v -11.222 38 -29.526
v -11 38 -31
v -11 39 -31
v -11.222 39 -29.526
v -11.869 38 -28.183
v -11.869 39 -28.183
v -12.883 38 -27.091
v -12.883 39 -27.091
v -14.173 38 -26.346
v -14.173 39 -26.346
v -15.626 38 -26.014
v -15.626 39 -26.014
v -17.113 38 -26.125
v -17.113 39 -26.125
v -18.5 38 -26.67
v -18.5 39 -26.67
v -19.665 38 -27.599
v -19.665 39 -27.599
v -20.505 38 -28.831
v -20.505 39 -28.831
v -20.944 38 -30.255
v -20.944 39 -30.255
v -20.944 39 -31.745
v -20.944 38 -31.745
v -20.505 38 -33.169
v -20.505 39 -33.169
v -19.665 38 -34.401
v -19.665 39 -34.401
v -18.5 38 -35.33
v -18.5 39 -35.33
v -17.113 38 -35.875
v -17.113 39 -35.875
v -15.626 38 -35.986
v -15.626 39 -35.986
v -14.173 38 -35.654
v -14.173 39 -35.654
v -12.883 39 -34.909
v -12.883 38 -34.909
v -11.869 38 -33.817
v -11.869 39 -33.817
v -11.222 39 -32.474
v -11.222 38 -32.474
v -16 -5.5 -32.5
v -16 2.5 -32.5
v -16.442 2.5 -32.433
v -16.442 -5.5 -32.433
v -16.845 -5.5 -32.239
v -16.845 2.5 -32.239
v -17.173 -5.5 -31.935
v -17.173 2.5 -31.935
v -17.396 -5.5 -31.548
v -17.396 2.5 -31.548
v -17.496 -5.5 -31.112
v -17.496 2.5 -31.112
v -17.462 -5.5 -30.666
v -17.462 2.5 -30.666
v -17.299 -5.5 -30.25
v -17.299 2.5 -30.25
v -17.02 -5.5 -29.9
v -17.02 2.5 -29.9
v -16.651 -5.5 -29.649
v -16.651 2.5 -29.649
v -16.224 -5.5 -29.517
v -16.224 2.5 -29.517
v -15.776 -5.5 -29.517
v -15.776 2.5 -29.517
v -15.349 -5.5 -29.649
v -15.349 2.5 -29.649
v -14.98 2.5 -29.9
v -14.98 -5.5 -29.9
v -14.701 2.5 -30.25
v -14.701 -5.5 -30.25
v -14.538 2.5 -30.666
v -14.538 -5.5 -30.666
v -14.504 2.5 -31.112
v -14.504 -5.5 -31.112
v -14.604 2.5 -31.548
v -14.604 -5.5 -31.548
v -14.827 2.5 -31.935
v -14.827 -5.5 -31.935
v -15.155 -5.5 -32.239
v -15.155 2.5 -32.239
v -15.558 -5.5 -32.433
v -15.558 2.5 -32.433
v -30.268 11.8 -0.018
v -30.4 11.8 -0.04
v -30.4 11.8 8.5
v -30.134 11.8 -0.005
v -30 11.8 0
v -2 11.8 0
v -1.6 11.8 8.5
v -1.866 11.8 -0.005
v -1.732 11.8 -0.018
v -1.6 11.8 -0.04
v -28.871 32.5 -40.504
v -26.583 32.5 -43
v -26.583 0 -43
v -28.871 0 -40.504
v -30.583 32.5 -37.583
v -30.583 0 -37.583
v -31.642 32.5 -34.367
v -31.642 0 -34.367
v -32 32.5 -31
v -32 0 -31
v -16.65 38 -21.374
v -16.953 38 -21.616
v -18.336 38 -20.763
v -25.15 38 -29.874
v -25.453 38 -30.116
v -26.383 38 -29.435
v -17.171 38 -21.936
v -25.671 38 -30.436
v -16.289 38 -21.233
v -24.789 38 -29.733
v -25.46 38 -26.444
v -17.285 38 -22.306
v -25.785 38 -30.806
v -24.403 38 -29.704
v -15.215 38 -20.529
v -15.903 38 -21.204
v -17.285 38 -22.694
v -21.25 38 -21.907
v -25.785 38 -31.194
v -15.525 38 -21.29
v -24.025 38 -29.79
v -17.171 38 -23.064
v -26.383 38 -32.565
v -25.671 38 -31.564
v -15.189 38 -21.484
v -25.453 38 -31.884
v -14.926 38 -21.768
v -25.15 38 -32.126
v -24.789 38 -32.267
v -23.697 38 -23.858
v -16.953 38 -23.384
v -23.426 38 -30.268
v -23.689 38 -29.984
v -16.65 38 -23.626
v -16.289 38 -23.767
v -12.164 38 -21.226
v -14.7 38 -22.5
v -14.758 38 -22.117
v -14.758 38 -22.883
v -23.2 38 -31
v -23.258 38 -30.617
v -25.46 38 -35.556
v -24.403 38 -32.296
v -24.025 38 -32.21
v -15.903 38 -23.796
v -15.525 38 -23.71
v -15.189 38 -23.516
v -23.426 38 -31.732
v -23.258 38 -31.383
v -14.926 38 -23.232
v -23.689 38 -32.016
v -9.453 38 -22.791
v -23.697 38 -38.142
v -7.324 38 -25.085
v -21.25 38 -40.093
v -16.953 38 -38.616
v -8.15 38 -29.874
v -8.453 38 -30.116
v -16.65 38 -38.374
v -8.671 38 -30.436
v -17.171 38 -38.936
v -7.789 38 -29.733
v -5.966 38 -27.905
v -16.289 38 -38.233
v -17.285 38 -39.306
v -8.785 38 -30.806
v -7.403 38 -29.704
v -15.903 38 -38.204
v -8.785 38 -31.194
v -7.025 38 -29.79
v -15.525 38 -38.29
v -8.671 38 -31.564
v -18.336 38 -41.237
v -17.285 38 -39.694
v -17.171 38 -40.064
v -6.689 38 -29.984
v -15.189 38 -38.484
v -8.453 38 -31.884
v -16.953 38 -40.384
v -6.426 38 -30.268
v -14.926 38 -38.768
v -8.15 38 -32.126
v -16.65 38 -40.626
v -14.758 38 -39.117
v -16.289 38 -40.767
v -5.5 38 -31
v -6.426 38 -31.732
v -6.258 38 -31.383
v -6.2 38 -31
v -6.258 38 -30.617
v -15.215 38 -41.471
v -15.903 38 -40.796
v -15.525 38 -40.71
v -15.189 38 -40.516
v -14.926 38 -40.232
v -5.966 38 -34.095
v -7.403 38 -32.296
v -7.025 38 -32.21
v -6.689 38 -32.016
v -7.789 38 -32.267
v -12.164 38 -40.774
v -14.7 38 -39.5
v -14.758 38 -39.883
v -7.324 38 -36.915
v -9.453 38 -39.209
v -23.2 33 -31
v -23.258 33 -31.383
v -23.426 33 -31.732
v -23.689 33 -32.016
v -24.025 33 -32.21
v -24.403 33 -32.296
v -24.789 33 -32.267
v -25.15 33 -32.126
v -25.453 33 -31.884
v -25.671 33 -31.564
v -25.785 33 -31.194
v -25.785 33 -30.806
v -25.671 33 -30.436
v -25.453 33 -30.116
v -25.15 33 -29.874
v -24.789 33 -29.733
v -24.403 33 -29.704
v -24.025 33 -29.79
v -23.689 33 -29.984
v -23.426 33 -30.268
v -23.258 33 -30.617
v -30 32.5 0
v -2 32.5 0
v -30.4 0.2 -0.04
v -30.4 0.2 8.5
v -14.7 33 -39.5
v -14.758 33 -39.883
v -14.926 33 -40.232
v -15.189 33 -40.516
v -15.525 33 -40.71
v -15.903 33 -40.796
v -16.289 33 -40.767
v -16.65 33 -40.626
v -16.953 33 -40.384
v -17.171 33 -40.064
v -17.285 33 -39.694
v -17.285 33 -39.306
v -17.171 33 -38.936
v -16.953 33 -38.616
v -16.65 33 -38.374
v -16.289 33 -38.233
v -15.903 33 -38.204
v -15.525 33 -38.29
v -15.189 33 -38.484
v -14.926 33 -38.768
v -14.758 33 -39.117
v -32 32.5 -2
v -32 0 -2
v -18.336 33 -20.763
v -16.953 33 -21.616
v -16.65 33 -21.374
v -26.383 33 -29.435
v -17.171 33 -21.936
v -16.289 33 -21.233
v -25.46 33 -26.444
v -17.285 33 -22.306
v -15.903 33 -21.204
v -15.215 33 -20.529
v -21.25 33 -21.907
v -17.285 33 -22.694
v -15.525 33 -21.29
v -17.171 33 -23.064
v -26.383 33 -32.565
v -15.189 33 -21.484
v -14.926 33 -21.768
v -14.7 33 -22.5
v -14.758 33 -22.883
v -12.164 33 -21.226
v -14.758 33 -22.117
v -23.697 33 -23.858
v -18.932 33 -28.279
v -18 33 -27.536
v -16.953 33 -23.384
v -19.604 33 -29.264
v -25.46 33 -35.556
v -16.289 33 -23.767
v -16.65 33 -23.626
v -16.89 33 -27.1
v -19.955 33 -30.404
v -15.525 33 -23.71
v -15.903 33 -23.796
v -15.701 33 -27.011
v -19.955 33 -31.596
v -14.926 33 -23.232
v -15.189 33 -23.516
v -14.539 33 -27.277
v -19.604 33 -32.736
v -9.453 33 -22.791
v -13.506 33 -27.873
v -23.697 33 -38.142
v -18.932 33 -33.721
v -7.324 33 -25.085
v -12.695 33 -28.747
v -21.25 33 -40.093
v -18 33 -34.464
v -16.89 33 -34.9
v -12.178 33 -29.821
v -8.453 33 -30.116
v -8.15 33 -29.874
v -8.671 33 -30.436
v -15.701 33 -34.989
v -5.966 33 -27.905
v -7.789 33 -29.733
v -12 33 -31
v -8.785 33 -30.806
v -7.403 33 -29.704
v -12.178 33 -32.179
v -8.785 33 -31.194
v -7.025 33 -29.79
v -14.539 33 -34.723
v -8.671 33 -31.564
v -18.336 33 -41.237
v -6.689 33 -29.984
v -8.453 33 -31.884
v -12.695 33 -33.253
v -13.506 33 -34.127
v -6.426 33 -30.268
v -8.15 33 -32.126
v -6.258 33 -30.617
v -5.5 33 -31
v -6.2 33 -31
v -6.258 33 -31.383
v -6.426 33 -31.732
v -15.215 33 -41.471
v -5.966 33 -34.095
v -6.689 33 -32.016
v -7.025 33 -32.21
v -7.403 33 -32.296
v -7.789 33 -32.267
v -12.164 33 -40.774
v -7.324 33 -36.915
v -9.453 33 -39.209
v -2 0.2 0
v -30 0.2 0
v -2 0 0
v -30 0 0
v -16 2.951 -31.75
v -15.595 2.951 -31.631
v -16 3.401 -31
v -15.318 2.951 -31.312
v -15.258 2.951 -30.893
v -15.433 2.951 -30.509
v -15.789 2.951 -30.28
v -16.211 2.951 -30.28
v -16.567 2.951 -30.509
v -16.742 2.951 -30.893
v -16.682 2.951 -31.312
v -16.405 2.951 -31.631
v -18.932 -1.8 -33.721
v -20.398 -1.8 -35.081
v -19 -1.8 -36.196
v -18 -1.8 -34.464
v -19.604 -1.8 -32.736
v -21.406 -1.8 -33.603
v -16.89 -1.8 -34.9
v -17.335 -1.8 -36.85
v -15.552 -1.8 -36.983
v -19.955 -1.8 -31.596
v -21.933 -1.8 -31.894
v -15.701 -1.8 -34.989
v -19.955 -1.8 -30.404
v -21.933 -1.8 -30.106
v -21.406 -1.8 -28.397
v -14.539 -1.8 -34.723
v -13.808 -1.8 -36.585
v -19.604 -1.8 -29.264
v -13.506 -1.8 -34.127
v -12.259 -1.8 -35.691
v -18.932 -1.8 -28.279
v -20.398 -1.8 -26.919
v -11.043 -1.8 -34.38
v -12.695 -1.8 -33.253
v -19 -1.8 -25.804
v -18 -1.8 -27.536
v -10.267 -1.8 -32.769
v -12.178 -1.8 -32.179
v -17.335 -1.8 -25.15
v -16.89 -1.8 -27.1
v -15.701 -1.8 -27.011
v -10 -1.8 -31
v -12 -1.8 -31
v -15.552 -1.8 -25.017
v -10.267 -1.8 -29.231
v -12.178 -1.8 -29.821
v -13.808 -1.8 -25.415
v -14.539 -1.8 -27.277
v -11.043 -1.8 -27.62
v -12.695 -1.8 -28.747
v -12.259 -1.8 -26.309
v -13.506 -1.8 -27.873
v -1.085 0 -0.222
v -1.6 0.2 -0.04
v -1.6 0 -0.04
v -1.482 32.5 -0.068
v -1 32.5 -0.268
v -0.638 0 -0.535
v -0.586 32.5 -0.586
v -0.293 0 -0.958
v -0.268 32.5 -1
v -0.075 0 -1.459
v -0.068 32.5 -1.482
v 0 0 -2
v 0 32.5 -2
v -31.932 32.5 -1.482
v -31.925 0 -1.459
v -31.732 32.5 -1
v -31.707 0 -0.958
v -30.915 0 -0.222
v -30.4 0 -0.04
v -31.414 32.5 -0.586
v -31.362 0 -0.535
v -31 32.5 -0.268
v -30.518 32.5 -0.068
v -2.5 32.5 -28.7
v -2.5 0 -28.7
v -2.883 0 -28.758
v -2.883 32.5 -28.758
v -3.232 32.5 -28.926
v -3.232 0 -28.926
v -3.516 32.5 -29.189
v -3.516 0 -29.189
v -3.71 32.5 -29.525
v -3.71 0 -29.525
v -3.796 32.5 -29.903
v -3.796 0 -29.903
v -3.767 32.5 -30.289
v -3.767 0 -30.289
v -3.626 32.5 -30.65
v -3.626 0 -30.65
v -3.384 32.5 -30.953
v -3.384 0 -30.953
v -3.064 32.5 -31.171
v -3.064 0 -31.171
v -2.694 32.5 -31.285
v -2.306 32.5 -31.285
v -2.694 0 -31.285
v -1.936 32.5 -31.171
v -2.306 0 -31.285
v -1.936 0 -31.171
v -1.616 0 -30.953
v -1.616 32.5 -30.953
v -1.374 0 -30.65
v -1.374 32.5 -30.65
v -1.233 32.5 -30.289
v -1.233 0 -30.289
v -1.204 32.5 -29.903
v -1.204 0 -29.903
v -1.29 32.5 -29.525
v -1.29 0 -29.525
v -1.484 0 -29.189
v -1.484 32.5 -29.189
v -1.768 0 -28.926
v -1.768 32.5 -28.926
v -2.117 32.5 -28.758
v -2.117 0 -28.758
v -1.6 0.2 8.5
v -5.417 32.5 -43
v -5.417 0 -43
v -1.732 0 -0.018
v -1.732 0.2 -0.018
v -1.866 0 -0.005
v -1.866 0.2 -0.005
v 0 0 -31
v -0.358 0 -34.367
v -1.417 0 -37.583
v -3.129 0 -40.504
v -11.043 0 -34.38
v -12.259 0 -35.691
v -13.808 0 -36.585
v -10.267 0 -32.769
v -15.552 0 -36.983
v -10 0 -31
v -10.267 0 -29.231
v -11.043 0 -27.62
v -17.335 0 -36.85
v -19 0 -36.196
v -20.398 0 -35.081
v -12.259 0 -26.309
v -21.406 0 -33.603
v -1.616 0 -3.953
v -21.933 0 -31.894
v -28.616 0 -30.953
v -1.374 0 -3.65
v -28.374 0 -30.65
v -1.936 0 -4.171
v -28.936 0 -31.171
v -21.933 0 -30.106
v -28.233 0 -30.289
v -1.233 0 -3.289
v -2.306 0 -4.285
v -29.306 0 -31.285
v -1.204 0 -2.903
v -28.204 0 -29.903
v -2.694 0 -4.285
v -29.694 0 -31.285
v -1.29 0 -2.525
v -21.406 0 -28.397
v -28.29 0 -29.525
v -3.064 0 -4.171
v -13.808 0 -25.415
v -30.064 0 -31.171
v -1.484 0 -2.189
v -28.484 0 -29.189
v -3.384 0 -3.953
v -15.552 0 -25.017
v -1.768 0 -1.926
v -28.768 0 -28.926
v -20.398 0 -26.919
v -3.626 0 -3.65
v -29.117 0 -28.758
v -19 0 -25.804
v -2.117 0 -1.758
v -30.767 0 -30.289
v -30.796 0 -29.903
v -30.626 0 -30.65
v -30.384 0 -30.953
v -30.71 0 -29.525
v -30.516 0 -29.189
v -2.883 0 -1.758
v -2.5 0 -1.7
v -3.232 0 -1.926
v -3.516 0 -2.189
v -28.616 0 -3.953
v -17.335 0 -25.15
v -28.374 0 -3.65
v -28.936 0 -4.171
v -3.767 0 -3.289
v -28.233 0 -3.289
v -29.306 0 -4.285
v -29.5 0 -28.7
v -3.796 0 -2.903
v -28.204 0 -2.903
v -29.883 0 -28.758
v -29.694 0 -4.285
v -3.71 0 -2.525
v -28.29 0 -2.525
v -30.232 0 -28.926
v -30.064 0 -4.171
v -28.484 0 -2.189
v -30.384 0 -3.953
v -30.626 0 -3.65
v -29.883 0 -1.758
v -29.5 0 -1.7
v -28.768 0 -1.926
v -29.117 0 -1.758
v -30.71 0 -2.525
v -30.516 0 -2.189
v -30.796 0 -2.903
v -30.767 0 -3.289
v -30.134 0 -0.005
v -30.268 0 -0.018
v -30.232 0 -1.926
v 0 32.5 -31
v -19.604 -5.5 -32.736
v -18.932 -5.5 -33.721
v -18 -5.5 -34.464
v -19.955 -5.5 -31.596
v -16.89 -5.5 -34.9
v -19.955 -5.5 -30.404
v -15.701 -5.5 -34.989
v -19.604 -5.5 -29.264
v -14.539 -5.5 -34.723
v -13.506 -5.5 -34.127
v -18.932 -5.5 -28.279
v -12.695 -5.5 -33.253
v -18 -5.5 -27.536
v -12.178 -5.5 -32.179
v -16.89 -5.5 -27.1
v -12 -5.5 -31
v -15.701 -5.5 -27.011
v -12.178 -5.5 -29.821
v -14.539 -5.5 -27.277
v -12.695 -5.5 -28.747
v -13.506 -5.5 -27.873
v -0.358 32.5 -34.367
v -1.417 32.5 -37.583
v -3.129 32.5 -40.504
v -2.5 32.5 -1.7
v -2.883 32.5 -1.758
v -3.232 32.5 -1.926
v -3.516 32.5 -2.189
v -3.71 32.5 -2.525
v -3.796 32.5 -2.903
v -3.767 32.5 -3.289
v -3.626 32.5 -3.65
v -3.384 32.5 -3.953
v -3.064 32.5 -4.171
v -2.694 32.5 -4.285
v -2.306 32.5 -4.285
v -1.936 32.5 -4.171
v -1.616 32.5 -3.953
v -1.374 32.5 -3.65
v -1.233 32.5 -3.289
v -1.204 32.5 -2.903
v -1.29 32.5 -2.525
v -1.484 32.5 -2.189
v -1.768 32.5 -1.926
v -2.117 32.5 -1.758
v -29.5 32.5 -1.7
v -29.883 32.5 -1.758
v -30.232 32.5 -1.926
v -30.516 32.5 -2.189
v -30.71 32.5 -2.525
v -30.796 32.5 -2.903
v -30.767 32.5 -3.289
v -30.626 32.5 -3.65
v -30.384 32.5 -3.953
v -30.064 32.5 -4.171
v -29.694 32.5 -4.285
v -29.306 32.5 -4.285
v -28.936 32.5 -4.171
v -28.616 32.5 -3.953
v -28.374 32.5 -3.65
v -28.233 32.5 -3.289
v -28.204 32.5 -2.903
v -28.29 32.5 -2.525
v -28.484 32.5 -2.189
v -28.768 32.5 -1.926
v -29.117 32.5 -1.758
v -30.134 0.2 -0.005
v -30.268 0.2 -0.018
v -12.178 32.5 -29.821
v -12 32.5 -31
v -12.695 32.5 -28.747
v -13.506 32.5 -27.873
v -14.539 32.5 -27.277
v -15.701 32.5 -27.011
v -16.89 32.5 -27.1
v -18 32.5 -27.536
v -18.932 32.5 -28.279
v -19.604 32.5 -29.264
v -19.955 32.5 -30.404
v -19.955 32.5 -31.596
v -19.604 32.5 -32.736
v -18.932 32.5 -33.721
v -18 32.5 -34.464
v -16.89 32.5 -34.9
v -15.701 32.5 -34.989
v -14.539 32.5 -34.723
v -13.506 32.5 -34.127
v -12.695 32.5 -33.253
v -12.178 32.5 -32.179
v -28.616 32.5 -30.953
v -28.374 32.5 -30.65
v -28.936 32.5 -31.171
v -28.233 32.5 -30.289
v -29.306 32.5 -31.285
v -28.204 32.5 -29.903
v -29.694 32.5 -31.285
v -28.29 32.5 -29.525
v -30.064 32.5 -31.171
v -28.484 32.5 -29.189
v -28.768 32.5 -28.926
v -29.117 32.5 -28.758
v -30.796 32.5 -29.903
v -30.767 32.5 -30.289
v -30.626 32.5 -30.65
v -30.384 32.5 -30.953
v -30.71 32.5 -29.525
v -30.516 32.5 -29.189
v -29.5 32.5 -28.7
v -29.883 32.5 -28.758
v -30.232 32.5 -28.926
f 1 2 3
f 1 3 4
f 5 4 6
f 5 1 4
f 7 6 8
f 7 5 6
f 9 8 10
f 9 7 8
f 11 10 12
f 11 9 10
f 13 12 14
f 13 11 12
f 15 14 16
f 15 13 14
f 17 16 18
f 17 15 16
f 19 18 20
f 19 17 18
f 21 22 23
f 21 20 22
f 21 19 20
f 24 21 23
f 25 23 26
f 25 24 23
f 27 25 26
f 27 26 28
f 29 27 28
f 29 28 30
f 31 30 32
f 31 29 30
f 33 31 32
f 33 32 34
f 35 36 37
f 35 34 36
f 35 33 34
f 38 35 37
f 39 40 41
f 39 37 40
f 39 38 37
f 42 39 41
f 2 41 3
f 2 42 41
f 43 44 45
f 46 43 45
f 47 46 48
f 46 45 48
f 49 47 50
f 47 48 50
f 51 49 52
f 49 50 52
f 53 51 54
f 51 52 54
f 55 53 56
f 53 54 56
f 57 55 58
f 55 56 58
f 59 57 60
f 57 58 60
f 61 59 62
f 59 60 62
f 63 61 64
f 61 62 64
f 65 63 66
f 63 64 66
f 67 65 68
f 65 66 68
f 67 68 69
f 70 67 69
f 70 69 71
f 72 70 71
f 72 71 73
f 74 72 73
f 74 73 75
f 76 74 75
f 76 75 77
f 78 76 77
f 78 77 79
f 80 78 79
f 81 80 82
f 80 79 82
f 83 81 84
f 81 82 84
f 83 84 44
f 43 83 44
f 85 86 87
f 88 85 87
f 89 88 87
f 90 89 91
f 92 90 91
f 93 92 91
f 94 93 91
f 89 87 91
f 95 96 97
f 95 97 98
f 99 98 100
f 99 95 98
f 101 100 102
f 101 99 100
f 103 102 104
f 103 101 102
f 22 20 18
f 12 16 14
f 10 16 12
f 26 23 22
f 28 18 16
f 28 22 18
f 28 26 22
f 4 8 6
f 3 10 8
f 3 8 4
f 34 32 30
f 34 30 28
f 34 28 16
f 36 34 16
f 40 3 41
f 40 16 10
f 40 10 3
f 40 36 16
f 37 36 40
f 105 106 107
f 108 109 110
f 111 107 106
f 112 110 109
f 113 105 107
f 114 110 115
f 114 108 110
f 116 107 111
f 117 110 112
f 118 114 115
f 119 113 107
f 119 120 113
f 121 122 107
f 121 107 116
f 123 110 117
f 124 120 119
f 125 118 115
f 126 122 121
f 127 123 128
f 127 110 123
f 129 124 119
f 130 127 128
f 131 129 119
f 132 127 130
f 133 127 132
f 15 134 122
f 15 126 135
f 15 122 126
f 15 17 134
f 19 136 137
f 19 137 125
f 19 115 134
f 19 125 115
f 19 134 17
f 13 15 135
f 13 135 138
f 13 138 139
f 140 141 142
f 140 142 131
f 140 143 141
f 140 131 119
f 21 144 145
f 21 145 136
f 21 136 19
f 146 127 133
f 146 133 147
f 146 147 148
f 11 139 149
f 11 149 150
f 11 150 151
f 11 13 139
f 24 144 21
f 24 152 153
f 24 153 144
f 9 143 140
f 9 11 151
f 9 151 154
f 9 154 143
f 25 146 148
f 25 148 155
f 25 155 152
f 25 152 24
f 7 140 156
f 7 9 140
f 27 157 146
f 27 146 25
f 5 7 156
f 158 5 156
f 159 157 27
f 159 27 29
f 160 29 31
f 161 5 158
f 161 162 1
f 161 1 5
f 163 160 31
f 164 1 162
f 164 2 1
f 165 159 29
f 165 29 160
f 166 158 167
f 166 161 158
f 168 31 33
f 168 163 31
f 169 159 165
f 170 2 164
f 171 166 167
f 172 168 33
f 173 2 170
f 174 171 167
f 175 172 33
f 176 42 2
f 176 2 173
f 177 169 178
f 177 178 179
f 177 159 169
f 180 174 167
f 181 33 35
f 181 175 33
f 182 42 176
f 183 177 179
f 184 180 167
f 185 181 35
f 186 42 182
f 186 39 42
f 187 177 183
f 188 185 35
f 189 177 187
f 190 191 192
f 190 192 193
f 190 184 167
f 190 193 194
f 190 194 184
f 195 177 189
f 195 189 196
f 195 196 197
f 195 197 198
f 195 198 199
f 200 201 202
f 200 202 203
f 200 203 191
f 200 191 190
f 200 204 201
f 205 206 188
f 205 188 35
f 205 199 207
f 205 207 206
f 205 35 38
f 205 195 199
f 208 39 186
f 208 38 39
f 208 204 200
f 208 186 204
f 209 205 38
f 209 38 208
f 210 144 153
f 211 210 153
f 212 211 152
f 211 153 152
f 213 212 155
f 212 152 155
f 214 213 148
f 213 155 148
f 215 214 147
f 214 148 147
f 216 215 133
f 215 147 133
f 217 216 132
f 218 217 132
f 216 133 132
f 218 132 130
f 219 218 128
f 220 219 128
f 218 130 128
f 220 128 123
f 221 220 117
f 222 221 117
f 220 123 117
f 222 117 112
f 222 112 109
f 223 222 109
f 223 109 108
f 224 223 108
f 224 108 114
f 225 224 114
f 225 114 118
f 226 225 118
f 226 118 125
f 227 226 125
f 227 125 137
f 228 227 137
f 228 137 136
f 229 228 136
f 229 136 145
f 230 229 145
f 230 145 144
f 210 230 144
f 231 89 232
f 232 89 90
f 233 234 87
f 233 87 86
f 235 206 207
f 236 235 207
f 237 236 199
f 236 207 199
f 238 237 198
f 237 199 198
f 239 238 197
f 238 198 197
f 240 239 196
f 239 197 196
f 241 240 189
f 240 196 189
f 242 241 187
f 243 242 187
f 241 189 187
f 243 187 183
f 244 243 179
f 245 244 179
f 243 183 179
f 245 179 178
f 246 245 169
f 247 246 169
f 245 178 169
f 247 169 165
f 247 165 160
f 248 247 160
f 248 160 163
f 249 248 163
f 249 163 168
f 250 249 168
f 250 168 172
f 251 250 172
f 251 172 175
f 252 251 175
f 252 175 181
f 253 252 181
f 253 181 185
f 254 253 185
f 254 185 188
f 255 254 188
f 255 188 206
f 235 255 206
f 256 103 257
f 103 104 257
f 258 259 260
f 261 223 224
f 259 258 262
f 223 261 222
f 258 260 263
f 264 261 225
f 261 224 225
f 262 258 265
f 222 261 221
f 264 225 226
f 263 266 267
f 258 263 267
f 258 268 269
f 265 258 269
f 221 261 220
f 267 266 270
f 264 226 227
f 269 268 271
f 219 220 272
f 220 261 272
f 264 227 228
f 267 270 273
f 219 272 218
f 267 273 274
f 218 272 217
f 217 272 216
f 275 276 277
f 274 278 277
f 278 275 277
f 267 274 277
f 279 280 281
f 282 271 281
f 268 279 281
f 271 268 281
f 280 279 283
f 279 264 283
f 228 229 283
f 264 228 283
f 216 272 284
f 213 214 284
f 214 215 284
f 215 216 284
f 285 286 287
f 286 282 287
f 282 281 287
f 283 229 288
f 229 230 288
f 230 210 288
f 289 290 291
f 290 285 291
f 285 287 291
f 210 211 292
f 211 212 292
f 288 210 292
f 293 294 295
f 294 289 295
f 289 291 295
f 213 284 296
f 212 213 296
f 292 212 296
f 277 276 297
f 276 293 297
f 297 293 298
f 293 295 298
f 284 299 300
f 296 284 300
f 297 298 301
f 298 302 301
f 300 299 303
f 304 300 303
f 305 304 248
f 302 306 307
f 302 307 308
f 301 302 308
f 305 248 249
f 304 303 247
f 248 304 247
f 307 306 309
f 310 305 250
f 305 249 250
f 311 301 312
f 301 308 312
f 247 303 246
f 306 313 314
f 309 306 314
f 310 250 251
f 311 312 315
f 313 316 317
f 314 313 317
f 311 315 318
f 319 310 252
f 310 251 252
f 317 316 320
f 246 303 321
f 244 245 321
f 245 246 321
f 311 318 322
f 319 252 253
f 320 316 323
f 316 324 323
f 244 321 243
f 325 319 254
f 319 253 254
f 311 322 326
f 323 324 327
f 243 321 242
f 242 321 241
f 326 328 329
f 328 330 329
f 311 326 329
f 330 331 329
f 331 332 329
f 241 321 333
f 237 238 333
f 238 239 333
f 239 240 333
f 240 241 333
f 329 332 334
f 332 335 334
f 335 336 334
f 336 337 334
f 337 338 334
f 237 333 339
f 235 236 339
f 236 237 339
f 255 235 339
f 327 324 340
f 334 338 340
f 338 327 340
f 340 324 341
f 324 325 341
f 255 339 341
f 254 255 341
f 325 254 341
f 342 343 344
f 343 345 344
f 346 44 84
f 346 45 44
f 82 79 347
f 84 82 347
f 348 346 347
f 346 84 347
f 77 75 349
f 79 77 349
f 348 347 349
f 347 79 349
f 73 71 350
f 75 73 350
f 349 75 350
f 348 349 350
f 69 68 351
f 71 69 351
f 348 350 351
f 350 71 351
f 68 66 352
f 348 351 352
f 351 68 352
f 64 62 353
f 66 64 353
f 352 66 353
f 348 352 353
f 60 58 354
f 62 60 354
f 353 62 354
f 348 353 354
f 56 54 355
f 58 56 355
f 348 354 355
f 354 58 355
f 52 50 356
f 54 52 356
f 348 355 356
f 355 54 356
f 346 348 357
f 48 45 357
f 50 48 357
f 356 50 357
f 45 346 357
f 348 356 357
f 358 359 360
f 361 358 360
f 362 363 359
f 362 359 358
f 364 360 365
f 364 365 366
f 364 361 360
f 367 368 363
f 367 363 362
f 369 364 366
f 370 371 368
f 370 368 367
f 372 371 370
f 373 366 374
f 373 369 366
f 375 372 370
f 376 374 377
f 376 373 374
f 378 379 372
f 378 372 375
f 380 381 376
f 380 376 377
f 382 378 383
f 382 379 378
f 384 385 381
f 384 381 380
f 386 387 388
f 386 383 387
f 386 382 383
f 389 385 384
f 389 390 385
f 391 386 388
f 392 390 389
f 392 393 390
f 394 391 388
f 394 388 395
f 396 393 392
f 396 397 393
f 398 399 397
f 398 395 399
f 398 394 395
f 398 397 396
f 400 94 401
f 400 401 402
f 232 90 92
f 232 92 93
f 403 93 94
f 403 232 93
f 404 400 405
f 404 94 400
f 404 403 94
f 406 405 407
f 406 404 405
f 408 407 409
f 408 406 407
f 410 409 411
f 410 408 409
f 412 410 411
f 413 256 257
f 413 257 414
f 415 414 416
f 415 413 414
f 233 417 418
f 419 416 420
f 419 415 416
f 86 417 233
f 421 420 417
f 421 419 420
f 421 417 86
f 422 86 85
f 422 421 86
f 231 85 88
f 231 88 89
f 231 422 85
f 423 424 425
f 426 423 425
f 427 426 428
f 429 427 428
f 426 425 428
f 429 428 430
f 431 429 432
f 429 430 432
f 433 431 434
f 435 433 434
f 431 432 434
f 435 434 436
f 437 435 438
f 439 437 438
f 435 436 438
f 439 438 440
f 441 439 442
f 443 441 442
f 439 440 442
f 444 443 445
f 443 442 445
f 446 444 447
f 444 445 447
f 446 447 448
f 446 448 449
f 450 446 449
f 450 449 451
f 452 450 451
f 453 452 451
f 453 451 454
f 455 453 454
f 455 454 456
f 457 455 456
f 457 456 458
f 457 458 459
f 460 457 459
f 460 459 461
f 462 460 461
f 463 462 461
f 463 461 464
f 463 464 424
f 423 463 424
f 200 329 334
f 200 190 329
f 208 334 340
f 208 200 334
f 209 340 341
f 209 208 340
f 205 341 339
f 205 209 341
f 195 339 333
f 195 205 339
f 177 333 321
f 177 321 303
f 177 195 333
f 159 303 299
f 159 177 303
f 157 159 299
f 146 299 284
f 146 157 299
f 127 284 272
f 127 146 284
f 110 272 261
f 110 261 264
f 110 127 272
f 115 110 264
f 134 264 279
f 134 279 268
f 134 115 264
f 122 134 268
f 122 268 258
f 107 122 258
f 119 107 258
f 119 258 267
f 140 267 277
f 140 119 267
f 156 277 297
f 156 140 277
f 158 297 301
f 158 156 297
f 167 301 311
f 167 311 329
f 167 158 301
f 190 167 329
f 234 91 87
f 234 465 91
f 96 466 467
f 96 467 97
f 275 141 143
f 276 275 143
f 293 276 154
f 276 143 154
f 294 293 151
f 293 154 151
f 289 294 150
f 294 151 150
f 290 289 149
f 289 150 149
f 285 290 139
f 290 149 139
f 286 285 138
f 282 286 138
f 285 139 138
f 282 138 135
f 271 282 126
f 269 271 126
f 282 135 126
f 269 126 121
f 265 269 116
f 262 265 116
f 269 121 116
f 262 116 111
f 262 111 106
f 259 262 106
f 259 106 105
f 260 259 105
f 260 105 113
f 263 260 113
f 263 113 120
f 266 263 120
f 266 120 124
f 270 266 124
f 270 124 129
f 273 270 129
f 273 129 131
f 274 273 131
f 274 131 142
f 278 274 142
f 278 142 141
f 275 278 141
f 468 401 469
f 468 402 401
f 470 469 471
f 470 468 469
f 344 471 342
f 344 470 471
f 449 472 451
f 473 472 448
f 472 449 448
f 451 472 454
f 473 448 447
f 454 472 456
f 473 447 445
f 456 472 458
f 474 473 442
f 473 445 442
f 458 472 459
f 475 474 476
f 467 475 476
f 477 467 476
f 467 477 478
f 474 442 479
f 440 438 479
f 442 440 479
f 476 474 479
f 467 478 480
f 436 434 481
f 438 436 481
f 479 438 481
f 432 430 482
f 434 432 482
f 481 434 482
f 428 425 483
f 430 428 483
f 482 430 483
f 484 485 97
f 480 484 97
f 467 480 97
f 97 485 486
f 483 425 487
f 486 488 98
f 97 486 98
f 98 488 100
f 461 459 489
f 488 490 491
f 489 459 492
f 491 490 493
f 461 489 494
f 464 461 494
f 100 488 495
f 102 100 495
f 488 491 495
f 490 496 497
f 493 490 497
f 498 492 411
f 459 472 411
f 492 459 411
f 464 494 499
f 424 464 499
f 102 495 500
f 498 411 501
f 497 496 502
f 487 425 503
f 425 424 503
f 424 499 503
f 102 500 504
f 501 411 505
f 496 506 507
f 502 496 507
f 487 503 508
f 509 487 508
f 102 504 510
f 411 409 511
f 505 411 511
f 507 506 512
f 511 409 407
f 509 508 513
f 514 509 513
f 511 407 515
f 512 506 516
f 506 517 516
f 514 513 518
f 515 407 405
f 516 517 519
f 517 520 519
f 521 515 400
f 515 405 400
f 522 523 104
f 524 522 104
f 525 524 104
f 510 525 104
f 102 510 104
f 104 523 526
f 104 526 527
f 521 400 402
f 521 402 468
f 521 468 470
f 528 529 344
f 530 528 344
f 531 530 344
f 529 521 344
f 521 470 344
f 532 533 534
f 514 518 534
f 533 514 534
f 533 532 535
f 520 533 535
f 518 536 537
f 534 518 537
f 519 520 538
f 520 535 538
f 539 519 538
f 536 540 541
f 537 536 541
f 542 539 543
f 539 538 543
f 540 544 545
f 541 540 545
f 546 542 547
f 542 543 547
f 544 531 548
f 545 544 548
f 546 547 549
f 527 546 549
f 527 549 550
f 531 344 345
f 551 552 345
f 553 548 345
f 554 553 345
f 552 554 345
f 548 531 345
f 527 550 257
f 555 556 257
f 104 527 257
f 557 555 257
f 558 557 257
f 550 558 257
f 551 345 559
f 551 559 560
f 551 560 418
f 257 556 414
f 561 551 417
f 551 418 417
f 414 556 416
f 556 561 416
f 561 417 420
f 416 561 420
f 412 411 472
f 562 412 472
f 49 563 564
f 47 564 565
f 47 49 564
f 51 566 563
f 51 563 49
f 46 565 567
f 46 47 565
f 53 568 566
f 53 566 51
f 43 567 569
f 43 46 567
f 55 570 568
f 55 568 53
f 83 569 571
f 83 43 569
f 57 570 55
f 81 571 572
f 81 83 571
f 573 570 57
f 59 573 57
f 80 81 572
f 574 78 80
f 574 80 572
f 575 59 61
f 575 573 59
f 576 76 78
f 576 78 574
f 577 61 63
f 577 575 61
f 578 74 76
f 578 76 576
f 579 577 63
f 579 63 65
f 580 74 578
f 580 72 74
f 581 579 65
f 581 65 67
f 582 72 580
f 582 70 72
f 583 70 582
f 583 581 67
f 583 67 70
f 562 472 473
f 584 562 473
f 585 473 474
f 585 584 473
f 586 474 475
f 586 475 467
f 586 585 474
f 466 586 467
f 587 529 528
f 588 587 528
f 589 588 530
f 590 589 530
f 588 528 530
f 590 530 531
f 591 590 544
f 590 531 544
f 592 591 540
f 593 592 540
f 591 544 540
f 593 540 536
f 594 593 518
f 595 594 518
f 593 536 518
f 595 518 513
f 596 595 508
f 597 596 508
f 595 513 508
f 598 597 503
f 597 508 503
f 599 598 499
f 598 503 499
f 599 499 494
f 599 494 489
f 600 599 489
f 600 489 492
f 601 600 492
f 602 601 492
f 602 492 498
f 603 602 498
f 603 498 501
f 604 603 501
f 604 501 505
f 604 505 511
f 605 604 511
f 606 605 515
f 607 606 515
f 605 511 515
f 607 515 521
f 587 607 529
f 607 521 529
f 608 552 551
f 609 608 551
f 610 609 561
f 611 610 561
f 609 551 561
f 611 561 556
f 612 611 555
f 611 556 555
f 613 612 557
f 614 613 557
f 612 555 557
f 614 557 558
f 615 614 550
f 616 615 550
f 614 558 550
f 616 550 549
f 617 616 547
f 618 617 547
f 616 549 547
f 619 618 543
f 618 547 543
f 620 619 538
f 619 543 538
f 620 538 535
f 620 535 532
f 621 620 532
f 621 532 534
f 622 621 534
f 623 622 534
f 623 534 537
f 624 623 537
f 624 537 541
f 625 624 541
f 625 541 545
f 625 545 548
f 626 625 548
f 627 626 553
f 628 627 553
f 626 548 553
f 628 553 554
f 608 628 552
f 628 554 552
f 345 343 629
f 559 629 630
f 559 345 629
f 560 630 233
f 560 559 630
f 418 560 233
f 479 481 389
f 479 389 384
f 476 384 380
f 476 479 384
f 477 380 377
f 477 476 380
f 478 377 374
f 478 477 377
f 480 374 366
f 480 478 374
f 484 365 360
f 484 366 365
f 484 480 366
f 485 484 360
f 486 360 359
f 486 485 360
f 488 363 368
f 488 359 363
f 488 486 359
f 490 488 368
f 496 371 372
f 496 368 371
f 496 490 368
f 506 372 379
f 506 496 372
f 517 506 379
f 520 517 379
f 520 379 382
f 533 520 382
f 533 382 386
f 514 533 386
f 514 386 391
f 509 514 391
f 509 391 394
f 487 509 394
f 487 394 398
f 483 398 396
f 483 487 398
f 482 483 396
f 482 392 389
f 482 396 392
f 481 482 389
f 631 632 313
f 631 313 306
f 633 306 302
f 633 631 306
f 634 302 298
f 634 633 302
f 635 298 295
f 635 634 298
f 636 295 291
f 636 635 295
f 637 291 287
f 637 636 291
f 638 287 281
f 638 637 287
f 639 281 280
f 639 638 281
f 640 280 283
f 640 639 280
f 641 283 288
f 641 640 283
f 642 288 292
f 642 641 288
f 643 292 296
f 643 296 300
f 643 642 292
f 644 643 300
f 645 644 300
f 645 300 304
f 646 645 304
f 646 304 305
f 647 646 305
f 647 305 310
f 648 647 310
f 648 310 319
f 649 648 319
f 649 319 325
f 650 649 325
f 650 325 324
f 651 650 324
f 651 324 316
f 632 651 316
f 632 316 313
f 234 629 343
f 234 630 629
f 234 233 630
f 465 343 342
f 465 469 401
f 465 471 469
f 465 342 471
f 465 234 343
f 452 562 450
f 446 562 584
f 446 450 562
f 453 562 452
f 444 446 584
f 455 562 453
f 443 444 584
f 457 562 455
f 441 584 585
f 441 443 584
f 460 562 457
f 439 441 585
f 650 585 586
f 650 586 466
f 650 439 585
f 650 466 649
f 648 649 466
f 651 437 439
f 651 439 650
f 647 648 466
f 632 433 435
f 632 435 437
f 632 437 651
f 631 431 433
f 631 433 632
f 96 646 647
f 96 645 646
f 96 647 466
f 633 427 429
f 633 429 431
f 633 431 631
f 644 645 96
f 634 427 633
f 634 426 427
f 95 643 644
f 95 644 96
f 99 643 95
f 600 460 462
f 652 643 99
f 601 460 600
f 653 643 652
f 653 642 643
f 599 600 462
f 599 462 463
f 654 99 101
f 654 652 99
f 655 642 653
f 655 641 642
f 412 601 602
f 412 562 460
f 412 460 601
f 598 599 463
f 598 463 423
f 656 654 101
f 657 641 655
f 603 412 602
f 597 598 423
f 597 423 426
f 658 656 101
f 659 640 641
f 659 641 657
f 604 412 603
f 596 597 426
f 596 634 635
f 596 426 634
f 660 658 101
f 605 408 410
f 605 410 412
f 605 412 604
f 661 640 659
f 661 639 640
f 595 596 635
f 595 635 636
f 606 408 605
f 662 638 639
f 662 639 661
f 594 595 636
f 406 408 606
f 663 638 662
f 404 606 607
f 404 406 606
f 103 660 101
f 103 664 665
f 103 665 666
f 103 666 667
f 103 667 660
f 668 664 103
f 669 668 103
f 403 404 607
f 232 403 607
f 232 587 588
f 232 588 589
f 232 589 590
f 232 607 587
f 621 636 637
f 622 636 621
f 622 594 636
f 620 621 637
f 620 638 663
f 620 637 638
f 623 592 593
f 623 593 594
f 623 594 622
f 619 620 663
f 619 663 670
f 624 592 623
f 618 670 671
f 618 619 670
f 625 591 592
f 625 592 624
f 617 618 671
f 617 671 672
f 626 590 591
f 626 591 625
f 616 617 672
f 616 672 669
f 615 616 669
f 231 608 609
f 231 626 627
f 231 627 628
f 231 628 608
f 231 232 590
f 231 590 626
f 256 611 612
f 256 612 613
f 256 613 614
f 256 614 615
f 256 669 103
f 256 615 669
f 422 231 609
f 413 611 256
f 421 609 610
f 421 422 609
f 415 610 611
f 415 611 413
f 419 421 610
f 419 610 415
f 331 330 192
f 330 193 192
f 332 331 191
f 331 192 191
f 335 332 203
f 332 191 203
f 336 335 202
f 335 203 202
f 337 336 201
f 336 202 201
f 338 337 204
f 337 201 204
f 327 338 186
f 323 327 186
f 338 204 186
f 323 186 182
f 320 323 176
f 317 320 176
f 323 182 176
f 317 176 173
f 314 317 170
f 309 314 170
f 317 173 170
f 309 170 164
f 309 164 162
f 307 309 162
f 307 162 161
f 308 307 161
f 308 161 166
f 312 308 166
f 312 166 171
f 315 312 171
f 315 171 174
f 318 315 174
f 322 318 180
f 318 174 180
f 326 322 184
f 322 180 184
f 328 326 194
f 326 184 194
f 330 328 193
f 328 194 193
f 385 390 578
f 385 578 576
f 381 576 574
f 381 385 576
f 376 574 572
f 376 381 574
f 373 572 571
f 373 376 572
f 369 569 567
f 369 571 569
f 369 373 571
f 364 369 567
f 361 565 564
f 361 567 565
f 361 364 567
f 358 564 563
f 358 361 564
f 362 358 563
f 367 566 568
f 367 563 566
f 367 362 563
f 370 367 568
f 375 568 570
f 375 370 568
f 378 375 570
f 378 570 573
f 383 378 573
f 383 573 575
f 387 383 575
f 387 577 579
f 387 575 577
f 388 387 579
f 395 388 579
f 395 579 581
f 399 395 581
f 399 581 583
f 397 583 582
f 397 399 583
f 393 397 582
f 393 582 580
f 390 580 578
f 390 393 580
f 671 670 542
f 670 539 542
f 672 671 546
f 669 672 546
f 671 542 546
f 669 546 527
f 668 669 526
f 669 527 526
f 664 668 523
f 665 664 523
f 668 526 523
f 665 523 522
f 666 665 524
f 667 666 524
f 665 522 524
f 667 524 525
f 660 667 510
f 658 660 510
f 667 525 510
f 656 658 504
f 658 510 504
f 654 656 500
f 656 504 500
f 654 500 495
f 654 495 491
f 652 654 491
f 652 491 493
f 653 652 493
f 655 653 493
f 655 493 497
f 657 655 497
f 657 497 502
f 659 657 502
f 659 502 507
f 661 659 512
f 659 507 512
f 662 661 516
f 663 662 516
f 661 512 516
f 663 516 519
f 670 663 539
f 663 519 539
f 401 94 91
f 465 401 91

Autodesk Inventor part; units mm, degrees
ref_plane "YZ Plane" through (0, 0, 0) normal (1, 0, 0) x (0, 1, 0)
ref_plane "XZ Plane" through (0, 0, 0) normal (0, 1, 0) x (-1, 0, 0)
ref_plane "XY Plane" through (0, 0, 0) normal (0, 0, 1) x (1, 0, 0)
sketch "スケッチ1" plane through (0, 0, 0) normal (0, 1, 0) x (-1, 0, 0)
  line L0 (0, 0) -> (0, -43)
  line L1 (0, -43) -> (32, -43)
  line L2 (32, -43) -> (32, 0)
  line L3 (32, 0) -> (0, 0)
  dimension "d0" = 43
  dimension "d1" = 32
extrude "押し出し1" add sketch "スケッチ1" along normal blind 32.5
fillet "フィレット1" radius 2 2 edges at (-32, 16.25, 0) (0, 16.25, 0)
sketch "スケッチ2" plane through (0, 32.5, 0) normal (0, 1, 0) x (1, 0, 0)
  line L0 (0, 43) -> (-32, 43) projected
  line L1 (-16, 43) -> (-16, 0)
  line L2 (-30, 0) -> (-2, 0) projected
  line L3 (-16, 21.5) -> (-16, 3)
  line L4 (-16, 3) -> (-2.5, 3)
  line L5 (0, 2) -> (0, 43) projected
  line L6 (-16, 3) -> (-29.5, 3)
  line L7 (-29.5, 3) -> (-29.5, 30)
  point P0 (0, 0)
  point P1 (-2.5, 30)
  dimension "d5" = 18.5
  dimension "d6" = 13.5
  dimension "d7" = 13.5
  dimension "d8" = 27
hole "穴1" at (-2.5, 32.5, -3) at (-29.5, 32.5, -3) at (-29.5, 32.5, -30) at (-2.5, 32.5, -30) direction (0, -1, 0) diameter 2.6 end through all
sketch "スケッチ3" plane through (0, 32.5, 0) normal (0, 1, 0) x (1, 0, 0)
  line L0 (0, 43) -> (-32, 43) projected
  line L1 (-16, 43) -> (-16, 0)
  line L2 (-16, 21.5) -> (-16, 31)
  line L3 (-32, 43) -> (-32, 2) projected
  line L4 (-32, 31) -> (-32, 43)
  line L5 (-32, 43) -> (-26.583, 43)
  line L6 (0, 2) -> (0, 43) projected
  line L7 (0, 31) -> (0, 43)
  line L8 (0, 43) -> (-5.417, 43)
  arc A0 (-26.583, 43) -> (-32, 31) centre (-16, 31) ccw
  arc A1 (0, 31) -> (-5.417, 43) centre (-16, 31) ccw
  point P0 (0, 0)
  dimension "d16" = 9.5
extrude "押し出し2" cut sketch "スケッチ3" against normal blind 32.5
sketch "スケッチ4" plane through (0, 32.5, 0) normal (0, 1, 0) x (1, 0, 0)
  arc A0 (-26.583, 43) -> (-32, 31) centre (-16, 31) ccw projected
  circle A1 centre (-16, 31) radius 4
  point P0 (0, 0)
  dimension "d20" = 8
extrude "押し出し3" add sketch "スケッチ4" along normal blind 5
sketch "スケッチ5" plane through (0, 0, 0) normal (0, -1, 0) x (1, 0, 0)
  circle A0 centre (-16, -31) radius 4 projected
  circle A1 centre (-16, -31) radius 4
  point P0 (0, 0)
extrude "押し出し4" add sketch "スケッチ5" along normal blind 5.5
sketch "スケッチ6" plane through (0, 0, 0) normal (0, -1, 0) x (1, 0, 0)
  line L0 (-30, 0) -> (-2, 0) projected
  line L1 (-16, 0) -> (-1.6, 0)
  line L2 (-1.6, 0) -> (-1.6, 8.5)
  line L3 (-1.6, 0) -> (6.9, 0) construction
  line L4 (-1.6, 8.5) -> (-30.4, 8.5)
  line L5 (-30.4, 8.5) -> (-30.4, -0.1236)
  line L6 (-30.4, -0.1236) -> (-1.6, -0.1236)
  line L7 (-1.6, -0.1236) -> (-1.6, 0)
  point P0 (0, 0)
  dimension "d25" = 14.4
  dimension "d26" = 8.5
  dimension "d27" = 90
  dimension "d28" = 28.8
extrude "押し出し5" add sketch "スケッチ6" against normal blind 11.8
sketch "スケッチ7" plane through (0, 0, 0) normal (0, -1, 0) x (1, 0, 0)
  arc A0 (0, -2) -> (-2, 0) centre (-2, -2) ccw projected
  arc A1 (-1.6, -0.0404) -> (-2, 0) centre (-2, -2) ccw
  arc A2 (-30.4, -0.0404) -> (-32, -2) centre (-30, -2) ccw projected
  arc A3 (-30, 0) -> (-30.4, -0.0404) centre (-30, -2) ccw
  line L0 (-1.6, -0.0404) -> (-1.6, 8.5)
  line L1 (-1.6, 8.5) -> (-30.4, 8.5)
  line L2 (-30.4, 8.5) -> (-1.6, 8.5) projected
  line L3 (-30.4, 8.5) -> (-30.4, -0.0404)
  line L4 (-30, 0) -> (-2, 0)
  arc A4 (-30, 0) -> (-30.4, -0.0404) centre (-30, -2) ccw projected
  point P0 (0, 0)
extrude "押し出し6" cut sketch "スケッチ7" against normal blind 0.2
thread "ねじ1" size "M2.6x0.45" class "6H" standard "ANSI Metric M Profile" full length
thread "ねじ2" size "M2.6x0.45" class "6H" standard "ANSI Metric M Profile" full length
thread "ねじ3" size "M2.6x0.45" class "6H" standard "ANSI Metric M Profile" full length
thread "ねじ4" size "M2.6x0.45" class "6H" standard "ANSI Metric M Profile" full length
sketch "スケッチ12" plane through (-16, 38, -31) normal (0, 1, 0) x (1, 0, 0)
  circle A0 centre (0, 0) radius 10.5
  point P0 (16, -31)
  dimension "d66" = 21
extrude "押し出し9" add sketch "スケッチ12" against normal blind 5
sketch "スケッチ13" plane through (-16, 38, -31) normal (0, 1, 0) x (1, 0, 0)
  circle A0 centre (0, 0) radius 5
  point P0 (16, -31)
  dimension "d69" = 10
extrude "押し出し10" add sketch "スケッチ13" along normal blind 1
sketch "スケッチ14" plane through (-16, 38, -31) normal (0, 1, 0) x (1, 0, 0)
  circle A0 centre (0, 0) radius 8.5
  circle A1 centre (0, 8.5) radius 1.3
  circle A2 centre (-8.5, 0) radius 1.3
  circle A3 centre (8.5, 0) radius 1.3
  circle A4 centre (0, -8.5) radius 1.3
  point P0 (16, -31)
  dimension "d72" = 17
  dimension "d73" = 2.6
  dimension "d74" = 2.6
  dimension "d75" = 2.6
  dimension "d76" = 2.6
extrude "押し出し11" cut sketch "スケッチ14" against normal blind 5 contours A0 A3 | A0 A3 | A1 A0 | A0 A1 | A4 A0 | A0 A4 | A2 A0 | A0 A2
thread "ねじ9" size "M2.6x0.45" class "6H" standard "ANSI Metric M Profile" full length
thread "ねじ10" size "M2.6x0.45" class "6H" standard "ANSI Metric M Profile" full length
thread "ねじ11" size "M2.6x0.45" class "6H" standard "ANSI Metric M Profile" full length
thread "ねじ12" size "M2.6x0.45" class "6H" standard "ANSI Metric M Profile" full length
sketch "スケッチ15" plane through (0, 0, 0) normal (0, -1, 0) x (1, 0, 0)
  circle A0 centre (-16, -31) radius 4 projected
  circle A1 centre (-16, -31) radius 6
  point P0 (0, 0)
  dimension "d87" = 12
extrude "押し出し12" add sketch "スケッチ15" along normal blind 1.8
sketch "スケッチ16" plane through (-16, -5.5, -31) normal (0, -1, 0) x (1, 0, 0)
  point P0 (16, 31)
  point P1 (0, 0)
hole "穴3" at (-16, -5.5, -31) direction (0, 1, 0) diameter 3 depth 8 tip angle 118
thread "ねじ13" size "M3x0.5" class "6H" standard "ANSI Metric M Profile" full length
properties part number "B3M1040" material "アルミニウム 2014-T4"
